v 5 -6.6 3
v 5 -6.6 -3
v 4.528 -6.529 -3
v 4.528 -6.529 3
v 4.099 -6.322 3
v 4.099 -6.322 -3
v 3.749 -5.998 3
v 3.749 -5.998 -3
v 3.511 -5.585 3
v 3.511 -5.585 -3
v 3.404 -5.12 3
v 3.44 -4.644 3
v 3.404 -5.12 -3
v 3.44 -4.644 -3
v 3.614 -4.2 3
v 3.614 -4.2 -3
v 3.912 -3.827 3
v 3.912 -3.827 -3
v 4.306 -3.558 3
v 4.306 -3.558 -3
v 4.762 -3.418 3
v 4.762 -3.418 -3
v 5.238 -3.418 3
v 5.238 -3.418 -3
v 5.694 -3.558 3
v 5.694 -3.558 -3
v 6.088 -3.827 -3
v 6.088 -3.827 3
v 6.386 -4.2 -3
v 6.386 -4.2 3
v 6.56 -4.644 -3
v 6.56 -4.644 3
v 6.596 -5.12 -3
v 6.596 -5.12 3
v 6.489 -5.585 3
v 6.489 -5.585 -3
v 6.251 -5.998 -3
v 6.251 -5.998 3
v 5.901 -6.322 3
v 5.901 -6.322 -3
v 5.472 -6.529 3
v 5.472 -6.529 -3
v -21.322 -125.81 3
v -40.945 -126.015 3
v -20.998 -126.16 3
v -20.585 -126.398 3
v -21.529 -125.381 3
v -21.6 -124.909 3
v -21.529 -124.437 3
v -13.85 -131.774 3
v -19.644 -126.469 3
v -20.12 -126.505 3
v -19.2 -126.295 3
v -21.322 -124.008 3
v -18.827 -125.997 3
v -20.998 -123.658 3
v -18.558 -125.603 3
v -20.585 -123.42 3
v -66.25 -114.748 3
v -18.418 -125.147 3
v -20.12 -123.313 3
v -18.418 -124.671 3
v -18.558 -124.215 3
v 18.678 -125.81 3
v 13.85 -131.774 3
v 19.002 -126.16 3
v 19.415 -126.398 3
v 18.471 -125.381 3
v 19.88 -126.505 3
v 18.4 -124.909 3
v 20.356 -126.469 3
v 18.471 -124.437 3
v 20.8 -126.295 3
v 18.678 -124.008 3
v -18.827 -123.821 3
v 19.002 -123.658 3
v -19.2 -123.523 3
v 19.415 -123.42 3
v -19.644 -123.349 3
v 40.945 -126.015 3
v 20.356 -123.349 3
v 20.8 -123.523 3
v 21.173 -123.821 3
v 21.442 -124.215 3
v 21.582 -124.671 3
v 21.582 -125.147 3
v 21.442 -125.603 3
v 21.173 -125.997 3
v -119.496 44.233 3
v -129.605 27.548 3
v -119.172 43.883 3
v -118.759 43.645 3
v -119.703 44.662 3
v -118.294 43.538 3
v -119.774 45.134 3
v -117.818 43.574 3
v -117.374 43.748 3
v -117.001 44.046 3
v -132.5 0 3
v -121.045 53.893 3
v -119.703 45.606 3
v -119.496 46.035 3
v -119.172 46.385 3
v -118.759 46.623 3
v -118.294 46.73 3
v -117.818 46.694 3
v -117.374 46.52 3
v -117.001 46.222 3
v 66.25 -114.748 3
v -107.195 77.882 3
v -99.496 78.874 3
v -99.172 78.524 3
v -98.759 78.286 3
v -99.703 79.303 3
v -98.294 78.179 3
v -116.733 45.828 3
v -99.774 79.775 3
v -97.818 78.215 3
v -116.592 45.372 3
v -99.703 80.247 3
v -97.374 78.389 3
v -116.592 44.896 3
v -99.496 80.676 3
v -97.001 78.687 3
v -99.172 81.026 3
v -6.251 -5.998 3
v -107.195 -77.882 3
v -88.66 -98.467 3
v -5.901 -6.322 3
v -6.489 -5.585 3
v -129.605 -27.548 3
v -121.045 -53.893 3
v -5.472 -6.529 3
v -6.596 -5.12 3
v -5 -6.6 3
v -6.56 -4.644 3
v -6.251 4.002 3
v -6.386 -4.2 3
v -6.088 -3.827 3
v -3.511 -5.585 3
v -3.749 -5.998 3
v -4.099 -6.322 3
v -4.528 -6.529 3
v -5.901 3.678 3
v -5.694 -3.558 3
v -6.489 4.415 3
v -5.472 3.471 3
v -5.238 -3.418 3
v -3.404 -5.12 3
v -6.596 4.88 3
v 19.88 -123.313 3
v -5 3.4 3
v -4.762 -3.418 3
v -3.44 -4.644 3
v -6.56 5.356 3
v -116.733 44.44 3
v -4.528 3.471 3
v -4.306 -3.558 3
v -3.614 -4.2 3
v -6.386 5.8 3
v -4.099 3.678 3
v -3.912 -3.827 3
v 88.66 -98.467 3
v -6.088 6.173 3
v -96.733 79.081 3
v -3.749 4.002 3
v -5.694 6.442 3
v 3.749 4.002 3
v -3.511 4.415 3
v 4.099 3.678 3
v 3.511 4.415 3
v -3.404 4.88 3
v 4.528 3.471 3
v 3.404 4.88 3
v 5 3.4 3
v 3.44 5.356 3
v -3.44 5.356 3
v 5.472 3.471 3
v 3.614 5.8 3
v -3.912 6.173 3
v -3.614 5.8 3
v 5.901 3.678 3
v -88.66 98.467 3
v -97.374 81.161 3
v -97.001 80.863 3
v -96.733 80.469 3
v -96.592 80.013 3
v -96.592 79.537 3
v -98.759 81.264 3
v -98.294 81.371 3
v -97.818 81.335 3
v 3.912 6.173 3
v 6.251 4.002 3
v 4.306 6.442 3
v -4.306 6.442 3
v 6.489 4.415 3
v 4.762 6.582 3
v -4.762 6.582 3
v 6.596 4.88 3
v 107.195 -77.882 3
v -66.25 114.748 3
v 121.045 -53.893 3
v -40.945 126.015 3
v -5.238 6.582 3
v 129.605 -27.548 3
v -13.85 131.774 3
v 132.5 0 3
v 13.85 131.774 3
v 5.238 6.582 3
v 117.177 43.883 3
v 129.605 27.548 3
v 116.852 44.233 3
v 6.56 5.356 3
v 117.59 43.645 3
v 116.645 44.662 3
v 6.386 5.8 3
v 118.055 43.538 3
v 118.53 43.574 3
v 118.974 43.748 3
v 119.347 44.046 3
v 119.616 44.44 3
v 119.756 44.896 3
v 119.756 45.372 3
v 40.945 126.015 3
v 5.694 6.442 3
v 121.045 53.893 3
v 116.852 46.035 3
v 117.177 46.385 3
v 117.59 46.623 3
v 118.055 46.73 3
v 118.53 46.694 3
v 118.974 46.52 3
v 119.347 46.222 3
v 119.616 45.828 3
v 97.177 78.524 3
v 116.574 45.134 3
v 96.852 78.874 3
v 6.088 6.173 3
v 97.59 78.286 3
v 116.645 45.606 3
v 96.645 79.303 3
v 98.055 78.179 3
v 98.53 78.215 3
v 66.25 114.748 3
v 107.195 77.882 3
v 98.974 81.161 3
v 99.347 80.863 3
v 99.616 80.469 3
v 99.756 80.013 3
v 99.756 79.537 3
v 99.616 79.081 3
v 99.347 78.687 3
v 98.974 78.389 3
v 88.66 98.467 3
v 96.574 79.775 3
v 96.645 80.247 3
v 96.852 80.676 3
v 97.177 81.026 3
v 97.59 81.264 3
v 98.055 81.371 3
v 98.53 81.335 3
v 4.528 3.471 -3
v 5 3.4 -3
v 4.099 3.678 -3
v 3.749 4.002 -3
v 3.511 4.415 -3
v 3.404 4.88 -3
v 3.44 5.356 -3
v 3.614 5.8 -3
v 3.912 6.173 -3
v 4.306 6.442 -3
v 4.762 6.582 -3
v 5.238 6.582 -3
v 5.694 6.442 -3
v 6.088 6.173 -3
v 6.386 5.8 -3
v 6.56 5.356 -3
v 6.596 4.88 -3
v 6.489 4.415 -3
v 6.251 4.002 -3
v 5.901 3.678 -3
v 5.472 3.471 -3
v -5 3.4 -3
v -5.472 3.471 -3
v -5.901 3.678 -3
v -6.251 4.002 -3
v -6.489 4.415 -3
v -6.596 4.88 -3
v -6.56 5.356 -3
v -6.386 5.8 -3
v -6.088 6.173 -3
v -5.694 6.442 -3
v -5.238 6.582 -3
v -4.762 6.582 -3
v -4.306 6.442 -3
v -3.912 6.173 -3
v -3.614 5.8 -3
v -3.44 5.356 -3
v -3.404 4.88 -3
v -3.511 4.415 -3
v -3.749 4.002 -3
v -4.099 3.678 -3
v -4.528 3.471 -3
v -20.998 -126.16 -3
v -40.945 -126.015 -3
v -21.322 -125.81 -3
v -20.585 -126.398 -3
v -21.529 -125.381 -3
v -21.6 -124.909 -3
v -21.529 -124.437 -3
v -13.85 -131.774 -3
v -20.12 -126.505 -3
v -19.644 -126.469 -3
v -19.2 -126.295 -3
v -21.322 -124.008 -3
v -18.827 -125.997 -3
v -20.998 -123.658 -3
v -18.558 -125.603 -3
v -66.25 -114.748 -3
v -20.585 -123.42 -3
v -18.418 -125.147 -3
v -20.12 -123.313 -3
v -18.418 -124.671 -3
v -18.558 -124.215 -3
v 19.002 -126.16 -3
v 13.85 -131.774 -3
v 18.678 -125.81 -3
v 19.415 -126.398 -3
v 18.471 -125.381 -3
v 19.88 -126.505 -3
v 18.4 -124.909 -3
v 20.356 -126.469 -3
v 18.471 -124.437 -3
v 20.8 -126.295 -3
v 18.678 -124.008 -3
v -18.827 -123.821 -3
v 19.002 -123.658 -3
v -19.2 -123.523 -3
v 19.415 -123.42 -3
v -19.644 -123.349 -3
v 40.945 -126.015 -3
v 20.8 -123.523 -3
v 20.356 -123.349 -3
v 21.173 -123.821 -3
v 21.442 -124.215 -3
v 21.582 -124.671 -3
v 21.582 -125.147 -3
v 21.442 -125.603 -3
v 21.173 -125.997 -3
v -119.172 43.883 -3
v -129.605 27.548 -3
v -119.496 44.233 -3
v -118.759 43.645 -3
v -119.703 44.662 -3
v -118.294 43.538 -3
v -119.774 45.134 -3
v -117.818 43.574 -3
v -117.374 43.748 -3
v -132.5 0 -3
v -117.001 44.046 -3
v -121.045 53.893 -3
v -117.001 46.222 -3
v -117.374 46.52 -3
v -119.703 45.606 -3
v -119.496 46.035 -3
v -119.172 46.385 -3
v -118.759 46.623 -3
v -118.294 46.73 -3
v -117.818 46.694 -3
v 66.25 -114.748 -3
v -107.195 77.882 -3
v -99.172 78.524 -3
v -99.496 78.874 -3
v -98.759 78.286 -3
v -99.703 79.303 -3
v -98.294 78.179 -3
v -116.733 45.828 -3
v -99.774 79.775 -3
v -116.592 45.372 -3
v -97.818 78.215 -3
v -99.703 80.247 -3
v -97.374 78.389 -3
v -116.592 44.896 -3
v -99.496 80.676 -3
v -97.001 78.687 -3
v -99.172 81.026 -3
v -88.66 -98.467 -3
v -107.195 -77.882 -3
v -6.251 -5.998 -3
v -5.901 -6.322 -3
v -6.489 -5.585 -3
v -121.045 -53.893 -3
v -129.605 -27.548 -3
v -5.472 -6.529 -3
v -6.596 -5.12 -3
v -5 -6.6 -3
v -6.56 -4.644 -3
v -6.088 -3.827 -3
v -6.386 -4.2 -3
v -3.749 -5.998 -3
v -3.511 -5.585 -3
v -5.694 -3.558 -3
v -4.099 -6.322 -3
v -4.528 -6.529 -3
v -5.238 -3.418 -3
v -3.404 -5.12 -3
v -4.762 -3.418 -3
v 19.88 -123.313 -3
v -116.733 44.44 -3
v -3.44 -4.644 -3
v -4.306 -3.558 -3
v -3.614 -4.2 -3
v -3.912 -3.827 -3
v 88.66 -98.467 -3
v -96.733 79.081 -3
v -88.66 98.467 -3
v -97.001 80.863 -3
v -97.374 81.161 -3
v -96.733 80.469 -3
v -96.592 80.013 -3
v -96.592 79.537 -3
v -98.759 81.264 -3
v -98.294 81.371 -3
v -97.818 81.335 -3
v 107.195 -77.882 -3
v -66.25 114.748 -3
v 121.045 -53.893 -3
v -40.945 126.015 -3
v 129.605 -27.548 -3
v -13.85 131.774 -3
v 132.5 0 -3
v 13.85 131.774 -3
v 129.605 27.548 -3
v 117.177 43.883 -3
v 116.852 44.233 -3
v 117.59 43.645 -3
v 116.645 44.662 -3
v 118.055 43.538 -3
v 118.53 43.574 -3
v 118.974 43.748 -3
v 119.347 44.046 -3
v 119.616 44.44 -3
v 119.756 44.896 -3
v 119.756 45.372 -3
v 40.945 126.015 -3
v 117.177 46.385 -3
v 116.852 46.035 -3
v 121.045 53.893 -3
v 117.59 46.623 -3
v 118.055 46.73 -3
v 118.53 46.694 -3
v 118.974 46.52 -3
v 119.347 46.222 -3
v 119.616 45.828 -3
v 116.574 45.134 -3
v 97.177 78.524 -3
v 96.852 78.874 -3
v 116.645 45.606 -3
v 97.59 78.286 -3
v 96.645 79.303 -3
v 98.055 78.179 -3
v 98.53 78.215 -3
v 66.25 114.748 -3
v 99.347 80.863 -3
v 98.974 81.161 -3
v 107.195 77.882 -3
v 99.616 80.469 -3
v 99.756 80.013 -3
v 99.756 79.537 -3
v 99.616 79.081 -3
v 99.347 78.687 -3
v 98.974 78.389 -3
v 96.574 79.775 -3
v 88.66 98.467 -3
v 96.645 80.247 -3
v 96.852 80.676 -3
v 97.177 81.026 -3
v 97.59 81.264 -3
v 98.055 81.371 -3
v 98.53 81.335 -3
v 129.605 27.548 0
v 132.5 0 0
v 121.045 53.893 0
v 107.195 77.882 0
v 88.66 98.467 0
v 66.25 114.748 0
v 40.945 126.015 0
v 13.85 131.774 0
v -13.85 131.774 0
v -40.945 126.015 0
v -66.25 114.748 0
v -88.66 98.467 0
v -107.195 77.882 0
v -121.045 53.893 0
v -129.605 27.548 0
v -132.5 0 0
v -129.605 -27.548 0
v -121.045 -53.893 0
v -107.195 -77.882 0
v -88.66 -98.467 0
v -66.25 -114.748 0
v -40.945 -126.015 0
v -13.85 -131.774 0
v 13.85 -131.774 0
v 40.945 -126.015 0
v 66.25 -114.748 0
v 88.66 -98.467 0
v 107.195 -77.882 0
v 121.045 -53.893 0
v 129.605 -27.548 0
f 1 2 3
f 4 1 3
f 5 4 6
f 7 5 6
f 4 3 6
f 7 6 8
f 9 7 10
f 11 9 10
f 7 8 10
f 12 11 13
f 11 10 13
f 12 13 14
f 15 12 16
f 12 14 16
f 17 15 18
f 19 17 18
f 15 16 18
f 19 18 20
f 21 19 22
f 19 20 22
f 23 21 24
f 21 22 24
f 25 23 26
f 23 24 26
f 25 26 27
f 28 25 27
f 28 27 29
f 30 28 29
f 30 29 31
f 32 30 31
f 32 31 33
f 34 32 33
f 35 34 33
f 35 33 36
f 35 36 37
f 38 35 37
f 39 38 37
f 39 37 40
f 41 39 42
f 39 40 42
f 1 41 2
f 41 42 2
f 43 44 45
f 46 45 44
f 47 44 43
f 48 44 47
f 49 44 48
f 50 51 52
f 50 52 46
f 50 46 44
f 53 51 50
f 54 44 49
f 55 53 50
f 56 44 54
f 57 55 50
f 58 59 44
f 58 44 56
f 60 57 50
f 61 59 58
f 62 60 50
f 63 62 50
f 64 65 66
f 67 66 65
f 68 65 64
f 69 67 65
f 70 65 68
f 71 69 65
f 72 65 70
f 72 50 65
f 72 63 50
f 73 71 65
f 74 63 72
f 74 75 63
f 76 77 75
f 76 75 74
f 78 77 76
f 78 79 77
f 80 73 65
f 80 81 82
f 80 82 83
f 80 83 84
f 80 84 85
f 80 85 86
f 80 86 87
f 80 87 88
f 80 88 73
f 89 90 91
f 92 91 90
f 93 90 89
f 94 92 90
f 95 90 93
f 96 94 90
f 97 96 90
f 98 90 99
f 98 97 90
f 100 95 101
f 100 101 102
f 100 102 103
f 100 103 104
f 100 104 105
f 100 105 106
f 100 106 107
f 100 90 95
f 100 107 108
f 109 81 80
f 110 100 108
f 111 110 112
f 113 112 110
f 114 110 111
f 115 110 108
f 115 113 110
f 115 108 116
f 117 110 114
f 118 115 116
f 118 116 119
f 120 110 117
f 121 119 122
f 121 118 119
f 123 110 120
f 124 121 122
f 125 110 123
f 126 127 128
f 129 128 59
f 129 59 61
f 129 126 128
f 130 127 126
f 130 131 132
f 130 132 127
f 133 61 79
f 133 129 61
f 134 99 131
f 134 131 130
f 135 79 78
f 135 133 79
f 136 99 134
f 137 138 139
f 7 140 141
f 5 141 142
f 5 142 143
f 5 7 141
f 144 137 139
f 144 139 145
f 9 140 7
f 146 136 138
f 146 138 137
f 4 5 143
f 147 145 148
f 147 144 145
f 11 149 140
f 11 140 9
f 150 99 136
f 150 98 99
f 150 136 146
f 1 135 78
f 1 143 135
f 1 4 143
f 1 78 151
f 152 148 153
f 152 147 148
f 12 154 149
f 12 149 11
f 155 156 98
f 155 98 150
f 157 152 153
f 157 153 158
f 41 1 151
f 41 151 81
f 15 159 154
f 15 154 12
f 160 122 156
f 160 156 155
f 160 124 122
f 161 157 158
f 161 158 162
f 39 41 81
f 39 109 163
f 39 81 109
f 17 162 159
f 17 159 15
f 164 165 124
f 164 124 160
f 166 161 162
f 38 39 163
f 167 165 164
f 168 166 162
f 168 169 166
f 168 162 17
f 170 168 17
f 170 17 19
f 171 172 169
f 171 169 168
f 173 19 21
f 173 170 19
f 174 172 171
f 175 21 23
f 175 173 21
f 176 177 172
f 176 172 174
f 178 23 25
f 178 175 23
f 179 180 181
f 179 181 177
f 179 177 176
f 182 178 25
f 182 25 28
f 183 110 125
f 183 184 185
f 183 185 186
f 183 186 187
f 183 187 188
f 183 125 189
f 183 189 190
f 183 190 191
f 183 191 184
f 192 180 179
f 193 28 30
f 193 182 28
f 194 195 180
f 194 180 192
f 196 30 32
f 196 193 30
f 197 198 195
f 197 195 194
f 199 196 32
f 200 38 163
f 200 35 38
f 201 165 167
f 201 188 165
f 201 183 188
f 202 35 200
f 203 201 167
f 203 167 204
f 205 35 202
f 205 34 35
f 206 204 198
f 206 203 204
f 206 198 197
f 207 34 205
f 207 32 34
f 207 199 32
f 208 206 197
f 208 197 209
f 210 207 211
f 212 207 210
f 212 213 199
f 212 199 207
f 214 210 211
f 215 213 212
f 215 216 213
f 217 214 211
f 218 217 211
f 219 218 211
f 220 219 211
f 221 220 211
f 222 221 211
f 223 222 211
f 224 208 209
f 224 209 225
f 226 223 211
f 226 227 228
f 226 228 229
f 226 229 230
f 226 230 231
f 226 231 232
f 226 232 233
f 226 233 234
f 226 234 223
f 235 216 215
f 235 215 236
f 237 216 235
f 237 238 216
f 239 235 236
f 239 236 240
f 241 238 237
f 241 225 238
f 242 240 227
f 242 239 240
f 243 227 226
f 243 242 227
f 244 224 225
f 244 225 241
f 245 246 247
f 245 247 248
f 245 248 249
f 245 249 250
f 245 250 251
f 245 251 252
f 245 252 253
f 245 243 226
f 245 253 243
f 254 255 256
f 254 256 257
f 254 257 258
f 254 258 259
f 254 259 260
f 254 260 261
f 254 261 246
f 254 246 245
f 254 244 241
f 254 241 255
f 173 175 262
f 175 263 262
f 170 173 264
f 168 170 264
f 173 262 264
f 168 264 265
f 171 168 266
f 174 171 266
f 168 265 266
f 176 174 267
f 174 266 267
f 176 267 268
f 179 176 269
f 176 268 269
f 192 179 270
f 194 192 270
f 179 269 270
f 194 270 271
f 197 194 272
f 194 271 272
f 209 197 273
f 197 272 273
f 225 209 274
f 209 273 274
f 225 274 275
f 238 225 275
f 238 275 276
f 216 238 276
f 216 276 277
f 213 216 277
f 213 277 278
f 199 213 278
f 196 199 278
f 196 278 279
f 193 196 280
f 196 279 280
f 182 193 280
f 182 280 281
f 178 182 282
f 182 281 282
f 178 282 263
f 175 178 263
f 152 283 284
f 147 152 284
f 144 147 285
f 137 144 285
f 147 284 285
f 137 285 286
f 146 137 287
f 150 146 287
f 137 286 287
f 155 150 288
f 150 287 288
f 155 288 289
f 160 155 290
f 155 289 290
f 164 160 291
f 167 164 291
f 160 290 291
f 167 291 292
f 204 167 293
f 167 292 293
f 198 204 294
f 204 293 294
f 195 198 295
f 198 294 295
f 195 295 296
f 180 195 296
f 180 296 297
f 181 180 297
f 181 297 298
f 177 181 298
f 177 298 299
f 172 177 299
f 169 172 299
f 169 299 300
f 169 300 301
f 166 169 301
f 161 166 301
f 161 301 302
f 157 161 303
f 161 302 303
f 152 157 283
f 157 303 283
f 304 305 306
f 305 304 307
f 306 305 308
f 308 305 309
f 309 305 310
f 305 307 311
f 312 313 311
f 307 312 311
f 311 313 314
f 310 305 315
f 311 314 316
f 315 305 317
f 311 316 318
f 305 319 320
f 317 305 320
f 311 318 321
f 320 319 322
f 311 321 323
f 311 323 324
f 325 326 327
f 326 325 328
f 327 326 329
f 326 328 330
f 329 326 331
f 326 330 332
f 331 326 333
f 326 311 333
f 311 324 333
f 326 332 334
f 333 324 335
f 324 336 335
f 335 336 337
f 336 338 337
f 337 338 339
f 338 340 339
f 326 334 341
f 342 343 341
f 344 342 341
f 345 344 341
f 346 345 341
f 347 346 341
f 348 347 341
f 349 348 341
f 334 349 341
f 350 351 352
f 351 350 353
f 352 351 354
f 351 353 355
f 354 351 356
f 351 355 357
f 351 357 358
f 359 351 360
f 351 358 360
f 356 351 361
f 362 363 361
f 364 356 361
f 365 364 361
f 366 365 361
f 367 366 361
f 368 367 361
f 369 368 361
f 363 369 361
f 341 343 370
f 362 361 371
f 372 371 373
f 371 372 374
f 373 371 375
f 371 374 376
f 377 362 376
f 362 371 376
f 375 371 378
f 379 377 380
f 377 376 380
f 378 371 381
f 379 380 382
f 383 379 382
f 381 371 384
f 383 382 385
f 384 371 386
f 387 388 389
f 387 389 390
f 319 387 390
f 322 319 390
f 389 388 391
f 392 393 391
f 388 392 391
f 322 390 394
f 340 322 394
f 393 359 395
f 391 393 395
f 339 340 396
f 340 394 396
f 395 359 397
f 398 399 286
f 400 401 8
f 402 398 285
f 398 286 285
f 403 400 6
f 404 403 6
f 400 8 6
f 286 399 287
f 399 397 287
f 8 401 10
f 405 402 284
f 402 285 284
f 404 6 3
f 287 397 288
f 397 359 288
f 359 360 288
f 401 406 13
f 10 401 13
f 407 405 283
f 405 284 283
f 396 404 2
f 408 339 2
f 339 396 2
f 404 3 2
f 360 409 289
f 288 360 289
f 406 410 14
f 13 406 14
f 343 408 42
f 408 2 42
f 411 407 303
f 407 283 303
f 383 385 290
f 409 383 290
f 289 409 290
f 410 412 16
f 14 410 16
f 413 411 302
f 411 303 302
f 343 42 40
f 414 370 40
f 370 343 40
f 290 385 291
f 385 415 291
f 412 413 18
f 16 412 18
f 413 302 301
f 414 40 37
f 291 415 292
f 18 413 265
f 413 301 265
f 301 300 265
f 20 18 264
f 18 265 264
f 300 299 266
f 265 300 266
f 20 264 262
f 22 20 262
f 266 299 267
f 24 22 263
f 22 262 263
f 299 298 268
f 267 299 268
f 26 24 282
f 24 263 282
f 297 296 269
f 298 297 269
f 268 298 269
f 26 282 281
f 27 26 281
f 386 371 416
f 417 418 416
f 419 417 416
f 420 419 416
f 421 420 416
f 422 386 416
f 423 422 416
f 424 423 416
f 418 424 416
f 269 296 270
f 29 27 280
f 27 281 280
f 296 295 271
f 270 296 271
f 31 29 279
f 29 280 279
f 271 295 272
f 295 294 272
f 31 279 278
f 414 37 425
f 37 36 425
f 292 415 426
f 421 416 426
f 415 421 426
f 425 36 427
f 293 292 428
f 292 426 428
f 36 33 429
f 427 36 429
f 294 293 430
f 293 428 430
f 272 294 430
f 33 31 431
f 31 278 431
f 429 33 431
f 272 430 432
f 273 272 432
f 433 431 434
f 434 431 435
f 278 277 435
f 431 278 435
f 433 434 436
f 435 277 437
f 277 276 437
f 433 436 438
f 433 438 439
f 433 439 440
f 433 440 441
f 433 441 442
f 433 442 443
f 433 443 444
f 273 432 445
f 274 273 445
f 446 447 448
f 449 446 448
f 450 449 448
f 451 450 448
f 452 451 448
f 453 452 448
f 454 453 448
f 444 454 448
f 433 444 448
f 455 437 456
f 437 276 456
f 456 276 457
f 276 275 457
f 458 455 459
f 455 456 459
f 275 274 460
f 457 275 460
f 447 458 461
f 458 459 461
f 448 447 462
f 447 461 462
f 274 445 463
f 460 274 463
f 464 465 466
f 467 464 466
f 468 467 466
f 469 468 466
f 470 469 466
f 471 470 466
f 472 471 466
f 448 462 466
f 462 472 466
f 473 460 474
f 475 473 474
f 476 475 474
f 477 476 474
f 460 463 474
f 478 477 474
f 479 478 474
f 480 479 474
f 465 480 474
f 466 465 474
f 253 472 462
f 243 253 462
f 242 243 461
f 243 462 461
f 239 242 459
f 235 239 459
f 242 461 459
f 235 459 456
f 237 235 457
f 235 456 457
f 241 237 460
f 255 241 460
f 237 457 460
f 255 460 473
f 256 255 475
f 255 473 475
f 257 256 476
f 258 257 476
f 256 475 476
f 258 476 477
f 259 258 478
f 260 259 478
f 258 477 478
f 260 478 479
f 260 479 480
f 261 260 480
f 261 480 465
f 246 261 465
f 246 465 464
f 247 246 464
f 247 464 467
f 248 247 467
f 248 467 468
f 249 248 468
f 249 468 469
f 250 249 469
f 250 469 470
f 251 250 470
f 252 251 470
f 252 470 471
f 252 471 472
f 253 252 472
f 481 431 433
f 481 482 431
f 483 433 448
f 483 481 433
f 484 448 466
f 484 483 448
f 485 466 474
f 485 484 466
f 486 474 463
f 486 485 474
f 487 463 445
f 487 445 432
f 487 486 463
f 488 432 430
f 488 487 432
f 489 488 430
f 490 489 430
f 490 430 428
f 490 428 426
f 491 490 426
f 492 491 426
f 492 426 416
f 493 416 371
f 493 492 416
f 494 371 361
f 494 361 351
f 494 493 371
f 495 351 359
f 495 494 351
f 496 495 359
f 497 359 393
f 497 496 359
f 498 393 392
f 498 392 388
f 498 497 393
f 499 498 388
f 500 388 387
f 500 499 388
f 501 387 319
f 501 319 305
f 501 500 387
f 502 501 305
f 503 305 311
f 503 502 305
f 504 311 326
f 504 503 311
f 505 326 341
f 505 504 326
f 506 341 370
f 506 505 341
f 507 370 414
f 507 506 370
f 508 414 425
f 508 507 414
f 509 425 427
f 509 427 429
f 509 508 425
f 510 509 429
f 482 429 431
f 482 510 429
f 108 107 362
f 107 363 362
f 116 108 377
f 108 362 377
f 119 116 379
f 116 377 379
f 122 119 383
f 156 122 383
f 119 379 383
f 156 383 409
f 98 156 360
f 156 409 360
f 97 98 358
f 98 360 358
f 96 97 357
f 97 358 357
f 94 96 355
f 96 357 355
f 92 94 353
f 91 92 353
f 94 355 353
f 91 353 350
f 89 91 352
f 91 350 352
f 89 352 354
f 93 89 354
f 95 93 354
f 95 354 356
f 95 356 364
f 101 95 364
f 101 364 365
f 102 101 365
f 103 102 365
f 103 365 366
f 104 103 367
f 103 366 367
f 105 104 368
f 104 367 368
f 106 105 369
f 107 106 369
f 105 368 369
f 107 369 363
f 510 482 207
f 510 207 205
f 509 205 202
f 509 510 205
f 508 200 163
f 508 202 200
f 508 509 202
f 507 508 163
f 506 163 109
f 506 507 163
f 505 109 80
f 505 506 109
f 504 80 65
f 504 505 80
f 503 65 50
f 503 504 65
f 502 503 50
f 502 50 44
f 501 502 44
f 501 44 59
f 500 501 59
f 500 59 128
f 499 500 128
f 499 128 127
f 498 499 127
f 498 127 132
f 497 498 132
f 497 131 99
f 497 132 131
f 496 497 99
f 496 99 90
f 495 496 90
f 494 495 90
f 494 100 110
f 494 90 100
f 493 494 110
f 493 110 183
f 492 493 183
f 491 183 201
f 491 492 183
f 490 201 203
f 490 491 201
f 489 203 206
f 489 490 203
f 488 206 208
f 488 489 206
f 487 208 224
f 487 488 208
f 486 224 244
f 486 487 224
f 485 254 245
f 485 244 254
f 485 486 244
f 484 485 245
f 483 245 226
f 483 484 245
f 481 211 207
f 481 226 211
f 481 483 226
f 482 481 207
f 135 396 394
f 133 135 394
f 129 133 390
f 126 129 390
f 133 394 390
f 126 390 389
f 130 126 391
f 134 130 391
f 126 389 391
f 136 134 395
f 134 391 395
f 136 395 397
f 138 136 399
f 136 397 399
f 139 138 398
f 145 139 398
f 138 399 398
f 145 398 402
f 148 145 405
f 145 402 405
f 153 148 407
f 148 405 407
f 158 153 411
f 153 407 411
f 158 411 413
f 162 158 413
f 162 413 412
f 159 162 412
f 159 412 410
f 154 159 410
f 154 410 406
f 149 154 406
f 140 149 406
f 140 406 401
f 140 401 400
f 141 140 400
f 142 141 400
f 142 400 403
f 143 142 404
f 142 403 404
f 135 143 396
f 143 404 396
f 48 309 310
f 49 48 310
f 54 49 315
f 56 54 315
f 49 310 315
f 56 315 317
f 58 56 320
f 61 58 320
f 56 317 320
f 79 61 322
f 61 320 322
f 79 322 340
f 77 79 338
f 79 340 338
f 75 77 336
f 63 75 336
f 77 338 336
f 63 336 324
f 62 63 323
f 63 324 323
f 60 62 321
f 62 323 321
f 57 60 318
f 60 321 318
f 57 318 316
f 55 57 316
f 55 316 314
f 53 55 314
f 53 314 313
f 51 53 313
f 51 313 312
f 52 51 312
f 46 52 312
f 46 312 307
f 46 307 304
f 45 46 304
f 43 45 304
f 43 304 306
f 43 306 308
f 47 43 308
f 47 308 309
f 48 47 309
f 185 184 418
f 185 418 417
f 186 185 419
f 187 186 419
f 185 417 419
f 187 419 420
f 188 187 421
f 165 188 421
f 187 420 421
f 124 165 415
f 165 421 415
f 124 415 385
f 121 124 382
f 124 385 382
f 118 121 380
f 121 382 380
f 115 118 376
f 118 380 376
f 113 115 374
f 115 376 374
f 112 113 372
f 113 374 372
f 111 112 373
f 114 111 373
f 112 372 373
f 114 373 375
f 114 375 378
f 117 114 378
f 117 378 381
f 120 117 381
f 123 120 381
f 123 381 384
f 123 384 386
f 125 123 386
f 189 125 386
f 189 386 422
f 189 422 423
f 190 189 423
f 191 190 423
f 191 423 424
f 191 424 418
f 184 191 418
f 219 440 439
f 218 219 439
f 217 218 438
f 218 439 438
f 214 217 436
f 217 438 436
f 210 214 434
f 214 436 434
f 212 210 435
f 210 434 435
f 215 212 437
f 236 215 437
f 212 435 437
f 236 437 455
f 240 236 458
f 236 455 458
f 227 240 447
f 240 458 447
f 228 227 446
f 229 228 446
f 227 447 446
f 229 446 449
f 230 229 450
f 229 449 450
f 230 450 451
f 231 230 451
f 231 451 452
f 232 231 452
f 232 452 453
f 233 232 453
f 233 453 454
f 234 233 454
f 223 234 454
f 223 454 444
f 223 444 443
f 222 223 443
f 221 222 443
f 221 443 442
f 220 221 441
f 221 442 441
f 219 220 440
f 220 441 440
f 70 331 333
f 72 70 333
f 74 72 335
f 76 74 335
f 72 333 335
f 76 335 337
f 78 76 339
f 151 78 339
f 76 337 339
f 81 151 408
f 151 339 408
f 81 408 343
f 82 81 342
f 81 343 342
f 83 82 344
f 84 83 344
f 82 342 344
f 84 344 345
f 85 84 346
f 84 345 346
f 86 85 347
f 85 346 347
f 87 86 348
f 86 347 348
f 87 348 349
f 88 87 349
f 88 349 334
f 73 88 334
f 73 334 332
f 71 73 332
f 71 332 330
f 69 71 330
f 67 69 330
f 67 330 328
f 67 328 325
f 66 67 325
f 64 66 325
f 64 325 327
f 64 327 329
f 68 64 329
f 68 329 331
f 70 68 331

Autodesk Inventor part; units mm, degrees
ref_plane "YZ Plane" through (0, 0, 0) normal (1, 0, 0) x (0, 1, 0)
ref_plane "XZ Plane" through (0, 0, 0) normal (0, 1, 0) x (-1, 0, 0)
ref_plane "XY Plane" through (0, 0, 0) normal (0, 0, 1) x (1, 0, 0)
sketch "Эскиз1" plane through (0, 0, 0) normal (0, 0, 1) x (1, 0, 0)
  circle A0 centre (0, 0) radius 132.5
  dimension "d0" = 265
extrude "Выдавливание1" add sketch "Эскиз1" along normal mid plane 6
sketch "Эскиз2" plane through (0, 0, -3) normal (0, 0, -1) x (-1, 0, 0)
  circle A0 centre (20, -124.909) radius 1.6 projected
  circle A1 centre (-20, -124.909) radius 1.6 projected
  point P0 (0, 0)
extrude "Выдавливание2" cut sketch "Эскиз2" against normal through all
pattern_circular "Круговой массив1" count 3 over 360 about axis through (0, 0, -10) along (0, 0, 1) of "Выдавливание2"
sketch "Эскиз3" plane through (0, 0, 3) normal (0, 0, 1) x (1, 0, 0)
  line L0 (-5, -5) -> (5, -5) construction
  line L1 (5, -5) -> (5, 5) construction
  line L2 (5, 5) -> (-5, 5) construction
  line L3 (-5, 5) -> (-5, -5) construction
  line L4 (-5, -5) -> (5, 5) construction
  line L5 (5, -5) -> (-5, 5) construction
  point P0 (0, 0)
  dimension "d8" = 10
hole "Отверстие1" at (-5, 5, 3) at (5, 5, 3) at (-5, -5, 3) at (5, -5, 3) direction (0, 0, -1) diameter 3.2 end through all clearance for "болты с шестигранной головкой / гайка ГОСТ 12876-67" size "M3" standard "ГОСТ"
properties part number "Диск опорный"
